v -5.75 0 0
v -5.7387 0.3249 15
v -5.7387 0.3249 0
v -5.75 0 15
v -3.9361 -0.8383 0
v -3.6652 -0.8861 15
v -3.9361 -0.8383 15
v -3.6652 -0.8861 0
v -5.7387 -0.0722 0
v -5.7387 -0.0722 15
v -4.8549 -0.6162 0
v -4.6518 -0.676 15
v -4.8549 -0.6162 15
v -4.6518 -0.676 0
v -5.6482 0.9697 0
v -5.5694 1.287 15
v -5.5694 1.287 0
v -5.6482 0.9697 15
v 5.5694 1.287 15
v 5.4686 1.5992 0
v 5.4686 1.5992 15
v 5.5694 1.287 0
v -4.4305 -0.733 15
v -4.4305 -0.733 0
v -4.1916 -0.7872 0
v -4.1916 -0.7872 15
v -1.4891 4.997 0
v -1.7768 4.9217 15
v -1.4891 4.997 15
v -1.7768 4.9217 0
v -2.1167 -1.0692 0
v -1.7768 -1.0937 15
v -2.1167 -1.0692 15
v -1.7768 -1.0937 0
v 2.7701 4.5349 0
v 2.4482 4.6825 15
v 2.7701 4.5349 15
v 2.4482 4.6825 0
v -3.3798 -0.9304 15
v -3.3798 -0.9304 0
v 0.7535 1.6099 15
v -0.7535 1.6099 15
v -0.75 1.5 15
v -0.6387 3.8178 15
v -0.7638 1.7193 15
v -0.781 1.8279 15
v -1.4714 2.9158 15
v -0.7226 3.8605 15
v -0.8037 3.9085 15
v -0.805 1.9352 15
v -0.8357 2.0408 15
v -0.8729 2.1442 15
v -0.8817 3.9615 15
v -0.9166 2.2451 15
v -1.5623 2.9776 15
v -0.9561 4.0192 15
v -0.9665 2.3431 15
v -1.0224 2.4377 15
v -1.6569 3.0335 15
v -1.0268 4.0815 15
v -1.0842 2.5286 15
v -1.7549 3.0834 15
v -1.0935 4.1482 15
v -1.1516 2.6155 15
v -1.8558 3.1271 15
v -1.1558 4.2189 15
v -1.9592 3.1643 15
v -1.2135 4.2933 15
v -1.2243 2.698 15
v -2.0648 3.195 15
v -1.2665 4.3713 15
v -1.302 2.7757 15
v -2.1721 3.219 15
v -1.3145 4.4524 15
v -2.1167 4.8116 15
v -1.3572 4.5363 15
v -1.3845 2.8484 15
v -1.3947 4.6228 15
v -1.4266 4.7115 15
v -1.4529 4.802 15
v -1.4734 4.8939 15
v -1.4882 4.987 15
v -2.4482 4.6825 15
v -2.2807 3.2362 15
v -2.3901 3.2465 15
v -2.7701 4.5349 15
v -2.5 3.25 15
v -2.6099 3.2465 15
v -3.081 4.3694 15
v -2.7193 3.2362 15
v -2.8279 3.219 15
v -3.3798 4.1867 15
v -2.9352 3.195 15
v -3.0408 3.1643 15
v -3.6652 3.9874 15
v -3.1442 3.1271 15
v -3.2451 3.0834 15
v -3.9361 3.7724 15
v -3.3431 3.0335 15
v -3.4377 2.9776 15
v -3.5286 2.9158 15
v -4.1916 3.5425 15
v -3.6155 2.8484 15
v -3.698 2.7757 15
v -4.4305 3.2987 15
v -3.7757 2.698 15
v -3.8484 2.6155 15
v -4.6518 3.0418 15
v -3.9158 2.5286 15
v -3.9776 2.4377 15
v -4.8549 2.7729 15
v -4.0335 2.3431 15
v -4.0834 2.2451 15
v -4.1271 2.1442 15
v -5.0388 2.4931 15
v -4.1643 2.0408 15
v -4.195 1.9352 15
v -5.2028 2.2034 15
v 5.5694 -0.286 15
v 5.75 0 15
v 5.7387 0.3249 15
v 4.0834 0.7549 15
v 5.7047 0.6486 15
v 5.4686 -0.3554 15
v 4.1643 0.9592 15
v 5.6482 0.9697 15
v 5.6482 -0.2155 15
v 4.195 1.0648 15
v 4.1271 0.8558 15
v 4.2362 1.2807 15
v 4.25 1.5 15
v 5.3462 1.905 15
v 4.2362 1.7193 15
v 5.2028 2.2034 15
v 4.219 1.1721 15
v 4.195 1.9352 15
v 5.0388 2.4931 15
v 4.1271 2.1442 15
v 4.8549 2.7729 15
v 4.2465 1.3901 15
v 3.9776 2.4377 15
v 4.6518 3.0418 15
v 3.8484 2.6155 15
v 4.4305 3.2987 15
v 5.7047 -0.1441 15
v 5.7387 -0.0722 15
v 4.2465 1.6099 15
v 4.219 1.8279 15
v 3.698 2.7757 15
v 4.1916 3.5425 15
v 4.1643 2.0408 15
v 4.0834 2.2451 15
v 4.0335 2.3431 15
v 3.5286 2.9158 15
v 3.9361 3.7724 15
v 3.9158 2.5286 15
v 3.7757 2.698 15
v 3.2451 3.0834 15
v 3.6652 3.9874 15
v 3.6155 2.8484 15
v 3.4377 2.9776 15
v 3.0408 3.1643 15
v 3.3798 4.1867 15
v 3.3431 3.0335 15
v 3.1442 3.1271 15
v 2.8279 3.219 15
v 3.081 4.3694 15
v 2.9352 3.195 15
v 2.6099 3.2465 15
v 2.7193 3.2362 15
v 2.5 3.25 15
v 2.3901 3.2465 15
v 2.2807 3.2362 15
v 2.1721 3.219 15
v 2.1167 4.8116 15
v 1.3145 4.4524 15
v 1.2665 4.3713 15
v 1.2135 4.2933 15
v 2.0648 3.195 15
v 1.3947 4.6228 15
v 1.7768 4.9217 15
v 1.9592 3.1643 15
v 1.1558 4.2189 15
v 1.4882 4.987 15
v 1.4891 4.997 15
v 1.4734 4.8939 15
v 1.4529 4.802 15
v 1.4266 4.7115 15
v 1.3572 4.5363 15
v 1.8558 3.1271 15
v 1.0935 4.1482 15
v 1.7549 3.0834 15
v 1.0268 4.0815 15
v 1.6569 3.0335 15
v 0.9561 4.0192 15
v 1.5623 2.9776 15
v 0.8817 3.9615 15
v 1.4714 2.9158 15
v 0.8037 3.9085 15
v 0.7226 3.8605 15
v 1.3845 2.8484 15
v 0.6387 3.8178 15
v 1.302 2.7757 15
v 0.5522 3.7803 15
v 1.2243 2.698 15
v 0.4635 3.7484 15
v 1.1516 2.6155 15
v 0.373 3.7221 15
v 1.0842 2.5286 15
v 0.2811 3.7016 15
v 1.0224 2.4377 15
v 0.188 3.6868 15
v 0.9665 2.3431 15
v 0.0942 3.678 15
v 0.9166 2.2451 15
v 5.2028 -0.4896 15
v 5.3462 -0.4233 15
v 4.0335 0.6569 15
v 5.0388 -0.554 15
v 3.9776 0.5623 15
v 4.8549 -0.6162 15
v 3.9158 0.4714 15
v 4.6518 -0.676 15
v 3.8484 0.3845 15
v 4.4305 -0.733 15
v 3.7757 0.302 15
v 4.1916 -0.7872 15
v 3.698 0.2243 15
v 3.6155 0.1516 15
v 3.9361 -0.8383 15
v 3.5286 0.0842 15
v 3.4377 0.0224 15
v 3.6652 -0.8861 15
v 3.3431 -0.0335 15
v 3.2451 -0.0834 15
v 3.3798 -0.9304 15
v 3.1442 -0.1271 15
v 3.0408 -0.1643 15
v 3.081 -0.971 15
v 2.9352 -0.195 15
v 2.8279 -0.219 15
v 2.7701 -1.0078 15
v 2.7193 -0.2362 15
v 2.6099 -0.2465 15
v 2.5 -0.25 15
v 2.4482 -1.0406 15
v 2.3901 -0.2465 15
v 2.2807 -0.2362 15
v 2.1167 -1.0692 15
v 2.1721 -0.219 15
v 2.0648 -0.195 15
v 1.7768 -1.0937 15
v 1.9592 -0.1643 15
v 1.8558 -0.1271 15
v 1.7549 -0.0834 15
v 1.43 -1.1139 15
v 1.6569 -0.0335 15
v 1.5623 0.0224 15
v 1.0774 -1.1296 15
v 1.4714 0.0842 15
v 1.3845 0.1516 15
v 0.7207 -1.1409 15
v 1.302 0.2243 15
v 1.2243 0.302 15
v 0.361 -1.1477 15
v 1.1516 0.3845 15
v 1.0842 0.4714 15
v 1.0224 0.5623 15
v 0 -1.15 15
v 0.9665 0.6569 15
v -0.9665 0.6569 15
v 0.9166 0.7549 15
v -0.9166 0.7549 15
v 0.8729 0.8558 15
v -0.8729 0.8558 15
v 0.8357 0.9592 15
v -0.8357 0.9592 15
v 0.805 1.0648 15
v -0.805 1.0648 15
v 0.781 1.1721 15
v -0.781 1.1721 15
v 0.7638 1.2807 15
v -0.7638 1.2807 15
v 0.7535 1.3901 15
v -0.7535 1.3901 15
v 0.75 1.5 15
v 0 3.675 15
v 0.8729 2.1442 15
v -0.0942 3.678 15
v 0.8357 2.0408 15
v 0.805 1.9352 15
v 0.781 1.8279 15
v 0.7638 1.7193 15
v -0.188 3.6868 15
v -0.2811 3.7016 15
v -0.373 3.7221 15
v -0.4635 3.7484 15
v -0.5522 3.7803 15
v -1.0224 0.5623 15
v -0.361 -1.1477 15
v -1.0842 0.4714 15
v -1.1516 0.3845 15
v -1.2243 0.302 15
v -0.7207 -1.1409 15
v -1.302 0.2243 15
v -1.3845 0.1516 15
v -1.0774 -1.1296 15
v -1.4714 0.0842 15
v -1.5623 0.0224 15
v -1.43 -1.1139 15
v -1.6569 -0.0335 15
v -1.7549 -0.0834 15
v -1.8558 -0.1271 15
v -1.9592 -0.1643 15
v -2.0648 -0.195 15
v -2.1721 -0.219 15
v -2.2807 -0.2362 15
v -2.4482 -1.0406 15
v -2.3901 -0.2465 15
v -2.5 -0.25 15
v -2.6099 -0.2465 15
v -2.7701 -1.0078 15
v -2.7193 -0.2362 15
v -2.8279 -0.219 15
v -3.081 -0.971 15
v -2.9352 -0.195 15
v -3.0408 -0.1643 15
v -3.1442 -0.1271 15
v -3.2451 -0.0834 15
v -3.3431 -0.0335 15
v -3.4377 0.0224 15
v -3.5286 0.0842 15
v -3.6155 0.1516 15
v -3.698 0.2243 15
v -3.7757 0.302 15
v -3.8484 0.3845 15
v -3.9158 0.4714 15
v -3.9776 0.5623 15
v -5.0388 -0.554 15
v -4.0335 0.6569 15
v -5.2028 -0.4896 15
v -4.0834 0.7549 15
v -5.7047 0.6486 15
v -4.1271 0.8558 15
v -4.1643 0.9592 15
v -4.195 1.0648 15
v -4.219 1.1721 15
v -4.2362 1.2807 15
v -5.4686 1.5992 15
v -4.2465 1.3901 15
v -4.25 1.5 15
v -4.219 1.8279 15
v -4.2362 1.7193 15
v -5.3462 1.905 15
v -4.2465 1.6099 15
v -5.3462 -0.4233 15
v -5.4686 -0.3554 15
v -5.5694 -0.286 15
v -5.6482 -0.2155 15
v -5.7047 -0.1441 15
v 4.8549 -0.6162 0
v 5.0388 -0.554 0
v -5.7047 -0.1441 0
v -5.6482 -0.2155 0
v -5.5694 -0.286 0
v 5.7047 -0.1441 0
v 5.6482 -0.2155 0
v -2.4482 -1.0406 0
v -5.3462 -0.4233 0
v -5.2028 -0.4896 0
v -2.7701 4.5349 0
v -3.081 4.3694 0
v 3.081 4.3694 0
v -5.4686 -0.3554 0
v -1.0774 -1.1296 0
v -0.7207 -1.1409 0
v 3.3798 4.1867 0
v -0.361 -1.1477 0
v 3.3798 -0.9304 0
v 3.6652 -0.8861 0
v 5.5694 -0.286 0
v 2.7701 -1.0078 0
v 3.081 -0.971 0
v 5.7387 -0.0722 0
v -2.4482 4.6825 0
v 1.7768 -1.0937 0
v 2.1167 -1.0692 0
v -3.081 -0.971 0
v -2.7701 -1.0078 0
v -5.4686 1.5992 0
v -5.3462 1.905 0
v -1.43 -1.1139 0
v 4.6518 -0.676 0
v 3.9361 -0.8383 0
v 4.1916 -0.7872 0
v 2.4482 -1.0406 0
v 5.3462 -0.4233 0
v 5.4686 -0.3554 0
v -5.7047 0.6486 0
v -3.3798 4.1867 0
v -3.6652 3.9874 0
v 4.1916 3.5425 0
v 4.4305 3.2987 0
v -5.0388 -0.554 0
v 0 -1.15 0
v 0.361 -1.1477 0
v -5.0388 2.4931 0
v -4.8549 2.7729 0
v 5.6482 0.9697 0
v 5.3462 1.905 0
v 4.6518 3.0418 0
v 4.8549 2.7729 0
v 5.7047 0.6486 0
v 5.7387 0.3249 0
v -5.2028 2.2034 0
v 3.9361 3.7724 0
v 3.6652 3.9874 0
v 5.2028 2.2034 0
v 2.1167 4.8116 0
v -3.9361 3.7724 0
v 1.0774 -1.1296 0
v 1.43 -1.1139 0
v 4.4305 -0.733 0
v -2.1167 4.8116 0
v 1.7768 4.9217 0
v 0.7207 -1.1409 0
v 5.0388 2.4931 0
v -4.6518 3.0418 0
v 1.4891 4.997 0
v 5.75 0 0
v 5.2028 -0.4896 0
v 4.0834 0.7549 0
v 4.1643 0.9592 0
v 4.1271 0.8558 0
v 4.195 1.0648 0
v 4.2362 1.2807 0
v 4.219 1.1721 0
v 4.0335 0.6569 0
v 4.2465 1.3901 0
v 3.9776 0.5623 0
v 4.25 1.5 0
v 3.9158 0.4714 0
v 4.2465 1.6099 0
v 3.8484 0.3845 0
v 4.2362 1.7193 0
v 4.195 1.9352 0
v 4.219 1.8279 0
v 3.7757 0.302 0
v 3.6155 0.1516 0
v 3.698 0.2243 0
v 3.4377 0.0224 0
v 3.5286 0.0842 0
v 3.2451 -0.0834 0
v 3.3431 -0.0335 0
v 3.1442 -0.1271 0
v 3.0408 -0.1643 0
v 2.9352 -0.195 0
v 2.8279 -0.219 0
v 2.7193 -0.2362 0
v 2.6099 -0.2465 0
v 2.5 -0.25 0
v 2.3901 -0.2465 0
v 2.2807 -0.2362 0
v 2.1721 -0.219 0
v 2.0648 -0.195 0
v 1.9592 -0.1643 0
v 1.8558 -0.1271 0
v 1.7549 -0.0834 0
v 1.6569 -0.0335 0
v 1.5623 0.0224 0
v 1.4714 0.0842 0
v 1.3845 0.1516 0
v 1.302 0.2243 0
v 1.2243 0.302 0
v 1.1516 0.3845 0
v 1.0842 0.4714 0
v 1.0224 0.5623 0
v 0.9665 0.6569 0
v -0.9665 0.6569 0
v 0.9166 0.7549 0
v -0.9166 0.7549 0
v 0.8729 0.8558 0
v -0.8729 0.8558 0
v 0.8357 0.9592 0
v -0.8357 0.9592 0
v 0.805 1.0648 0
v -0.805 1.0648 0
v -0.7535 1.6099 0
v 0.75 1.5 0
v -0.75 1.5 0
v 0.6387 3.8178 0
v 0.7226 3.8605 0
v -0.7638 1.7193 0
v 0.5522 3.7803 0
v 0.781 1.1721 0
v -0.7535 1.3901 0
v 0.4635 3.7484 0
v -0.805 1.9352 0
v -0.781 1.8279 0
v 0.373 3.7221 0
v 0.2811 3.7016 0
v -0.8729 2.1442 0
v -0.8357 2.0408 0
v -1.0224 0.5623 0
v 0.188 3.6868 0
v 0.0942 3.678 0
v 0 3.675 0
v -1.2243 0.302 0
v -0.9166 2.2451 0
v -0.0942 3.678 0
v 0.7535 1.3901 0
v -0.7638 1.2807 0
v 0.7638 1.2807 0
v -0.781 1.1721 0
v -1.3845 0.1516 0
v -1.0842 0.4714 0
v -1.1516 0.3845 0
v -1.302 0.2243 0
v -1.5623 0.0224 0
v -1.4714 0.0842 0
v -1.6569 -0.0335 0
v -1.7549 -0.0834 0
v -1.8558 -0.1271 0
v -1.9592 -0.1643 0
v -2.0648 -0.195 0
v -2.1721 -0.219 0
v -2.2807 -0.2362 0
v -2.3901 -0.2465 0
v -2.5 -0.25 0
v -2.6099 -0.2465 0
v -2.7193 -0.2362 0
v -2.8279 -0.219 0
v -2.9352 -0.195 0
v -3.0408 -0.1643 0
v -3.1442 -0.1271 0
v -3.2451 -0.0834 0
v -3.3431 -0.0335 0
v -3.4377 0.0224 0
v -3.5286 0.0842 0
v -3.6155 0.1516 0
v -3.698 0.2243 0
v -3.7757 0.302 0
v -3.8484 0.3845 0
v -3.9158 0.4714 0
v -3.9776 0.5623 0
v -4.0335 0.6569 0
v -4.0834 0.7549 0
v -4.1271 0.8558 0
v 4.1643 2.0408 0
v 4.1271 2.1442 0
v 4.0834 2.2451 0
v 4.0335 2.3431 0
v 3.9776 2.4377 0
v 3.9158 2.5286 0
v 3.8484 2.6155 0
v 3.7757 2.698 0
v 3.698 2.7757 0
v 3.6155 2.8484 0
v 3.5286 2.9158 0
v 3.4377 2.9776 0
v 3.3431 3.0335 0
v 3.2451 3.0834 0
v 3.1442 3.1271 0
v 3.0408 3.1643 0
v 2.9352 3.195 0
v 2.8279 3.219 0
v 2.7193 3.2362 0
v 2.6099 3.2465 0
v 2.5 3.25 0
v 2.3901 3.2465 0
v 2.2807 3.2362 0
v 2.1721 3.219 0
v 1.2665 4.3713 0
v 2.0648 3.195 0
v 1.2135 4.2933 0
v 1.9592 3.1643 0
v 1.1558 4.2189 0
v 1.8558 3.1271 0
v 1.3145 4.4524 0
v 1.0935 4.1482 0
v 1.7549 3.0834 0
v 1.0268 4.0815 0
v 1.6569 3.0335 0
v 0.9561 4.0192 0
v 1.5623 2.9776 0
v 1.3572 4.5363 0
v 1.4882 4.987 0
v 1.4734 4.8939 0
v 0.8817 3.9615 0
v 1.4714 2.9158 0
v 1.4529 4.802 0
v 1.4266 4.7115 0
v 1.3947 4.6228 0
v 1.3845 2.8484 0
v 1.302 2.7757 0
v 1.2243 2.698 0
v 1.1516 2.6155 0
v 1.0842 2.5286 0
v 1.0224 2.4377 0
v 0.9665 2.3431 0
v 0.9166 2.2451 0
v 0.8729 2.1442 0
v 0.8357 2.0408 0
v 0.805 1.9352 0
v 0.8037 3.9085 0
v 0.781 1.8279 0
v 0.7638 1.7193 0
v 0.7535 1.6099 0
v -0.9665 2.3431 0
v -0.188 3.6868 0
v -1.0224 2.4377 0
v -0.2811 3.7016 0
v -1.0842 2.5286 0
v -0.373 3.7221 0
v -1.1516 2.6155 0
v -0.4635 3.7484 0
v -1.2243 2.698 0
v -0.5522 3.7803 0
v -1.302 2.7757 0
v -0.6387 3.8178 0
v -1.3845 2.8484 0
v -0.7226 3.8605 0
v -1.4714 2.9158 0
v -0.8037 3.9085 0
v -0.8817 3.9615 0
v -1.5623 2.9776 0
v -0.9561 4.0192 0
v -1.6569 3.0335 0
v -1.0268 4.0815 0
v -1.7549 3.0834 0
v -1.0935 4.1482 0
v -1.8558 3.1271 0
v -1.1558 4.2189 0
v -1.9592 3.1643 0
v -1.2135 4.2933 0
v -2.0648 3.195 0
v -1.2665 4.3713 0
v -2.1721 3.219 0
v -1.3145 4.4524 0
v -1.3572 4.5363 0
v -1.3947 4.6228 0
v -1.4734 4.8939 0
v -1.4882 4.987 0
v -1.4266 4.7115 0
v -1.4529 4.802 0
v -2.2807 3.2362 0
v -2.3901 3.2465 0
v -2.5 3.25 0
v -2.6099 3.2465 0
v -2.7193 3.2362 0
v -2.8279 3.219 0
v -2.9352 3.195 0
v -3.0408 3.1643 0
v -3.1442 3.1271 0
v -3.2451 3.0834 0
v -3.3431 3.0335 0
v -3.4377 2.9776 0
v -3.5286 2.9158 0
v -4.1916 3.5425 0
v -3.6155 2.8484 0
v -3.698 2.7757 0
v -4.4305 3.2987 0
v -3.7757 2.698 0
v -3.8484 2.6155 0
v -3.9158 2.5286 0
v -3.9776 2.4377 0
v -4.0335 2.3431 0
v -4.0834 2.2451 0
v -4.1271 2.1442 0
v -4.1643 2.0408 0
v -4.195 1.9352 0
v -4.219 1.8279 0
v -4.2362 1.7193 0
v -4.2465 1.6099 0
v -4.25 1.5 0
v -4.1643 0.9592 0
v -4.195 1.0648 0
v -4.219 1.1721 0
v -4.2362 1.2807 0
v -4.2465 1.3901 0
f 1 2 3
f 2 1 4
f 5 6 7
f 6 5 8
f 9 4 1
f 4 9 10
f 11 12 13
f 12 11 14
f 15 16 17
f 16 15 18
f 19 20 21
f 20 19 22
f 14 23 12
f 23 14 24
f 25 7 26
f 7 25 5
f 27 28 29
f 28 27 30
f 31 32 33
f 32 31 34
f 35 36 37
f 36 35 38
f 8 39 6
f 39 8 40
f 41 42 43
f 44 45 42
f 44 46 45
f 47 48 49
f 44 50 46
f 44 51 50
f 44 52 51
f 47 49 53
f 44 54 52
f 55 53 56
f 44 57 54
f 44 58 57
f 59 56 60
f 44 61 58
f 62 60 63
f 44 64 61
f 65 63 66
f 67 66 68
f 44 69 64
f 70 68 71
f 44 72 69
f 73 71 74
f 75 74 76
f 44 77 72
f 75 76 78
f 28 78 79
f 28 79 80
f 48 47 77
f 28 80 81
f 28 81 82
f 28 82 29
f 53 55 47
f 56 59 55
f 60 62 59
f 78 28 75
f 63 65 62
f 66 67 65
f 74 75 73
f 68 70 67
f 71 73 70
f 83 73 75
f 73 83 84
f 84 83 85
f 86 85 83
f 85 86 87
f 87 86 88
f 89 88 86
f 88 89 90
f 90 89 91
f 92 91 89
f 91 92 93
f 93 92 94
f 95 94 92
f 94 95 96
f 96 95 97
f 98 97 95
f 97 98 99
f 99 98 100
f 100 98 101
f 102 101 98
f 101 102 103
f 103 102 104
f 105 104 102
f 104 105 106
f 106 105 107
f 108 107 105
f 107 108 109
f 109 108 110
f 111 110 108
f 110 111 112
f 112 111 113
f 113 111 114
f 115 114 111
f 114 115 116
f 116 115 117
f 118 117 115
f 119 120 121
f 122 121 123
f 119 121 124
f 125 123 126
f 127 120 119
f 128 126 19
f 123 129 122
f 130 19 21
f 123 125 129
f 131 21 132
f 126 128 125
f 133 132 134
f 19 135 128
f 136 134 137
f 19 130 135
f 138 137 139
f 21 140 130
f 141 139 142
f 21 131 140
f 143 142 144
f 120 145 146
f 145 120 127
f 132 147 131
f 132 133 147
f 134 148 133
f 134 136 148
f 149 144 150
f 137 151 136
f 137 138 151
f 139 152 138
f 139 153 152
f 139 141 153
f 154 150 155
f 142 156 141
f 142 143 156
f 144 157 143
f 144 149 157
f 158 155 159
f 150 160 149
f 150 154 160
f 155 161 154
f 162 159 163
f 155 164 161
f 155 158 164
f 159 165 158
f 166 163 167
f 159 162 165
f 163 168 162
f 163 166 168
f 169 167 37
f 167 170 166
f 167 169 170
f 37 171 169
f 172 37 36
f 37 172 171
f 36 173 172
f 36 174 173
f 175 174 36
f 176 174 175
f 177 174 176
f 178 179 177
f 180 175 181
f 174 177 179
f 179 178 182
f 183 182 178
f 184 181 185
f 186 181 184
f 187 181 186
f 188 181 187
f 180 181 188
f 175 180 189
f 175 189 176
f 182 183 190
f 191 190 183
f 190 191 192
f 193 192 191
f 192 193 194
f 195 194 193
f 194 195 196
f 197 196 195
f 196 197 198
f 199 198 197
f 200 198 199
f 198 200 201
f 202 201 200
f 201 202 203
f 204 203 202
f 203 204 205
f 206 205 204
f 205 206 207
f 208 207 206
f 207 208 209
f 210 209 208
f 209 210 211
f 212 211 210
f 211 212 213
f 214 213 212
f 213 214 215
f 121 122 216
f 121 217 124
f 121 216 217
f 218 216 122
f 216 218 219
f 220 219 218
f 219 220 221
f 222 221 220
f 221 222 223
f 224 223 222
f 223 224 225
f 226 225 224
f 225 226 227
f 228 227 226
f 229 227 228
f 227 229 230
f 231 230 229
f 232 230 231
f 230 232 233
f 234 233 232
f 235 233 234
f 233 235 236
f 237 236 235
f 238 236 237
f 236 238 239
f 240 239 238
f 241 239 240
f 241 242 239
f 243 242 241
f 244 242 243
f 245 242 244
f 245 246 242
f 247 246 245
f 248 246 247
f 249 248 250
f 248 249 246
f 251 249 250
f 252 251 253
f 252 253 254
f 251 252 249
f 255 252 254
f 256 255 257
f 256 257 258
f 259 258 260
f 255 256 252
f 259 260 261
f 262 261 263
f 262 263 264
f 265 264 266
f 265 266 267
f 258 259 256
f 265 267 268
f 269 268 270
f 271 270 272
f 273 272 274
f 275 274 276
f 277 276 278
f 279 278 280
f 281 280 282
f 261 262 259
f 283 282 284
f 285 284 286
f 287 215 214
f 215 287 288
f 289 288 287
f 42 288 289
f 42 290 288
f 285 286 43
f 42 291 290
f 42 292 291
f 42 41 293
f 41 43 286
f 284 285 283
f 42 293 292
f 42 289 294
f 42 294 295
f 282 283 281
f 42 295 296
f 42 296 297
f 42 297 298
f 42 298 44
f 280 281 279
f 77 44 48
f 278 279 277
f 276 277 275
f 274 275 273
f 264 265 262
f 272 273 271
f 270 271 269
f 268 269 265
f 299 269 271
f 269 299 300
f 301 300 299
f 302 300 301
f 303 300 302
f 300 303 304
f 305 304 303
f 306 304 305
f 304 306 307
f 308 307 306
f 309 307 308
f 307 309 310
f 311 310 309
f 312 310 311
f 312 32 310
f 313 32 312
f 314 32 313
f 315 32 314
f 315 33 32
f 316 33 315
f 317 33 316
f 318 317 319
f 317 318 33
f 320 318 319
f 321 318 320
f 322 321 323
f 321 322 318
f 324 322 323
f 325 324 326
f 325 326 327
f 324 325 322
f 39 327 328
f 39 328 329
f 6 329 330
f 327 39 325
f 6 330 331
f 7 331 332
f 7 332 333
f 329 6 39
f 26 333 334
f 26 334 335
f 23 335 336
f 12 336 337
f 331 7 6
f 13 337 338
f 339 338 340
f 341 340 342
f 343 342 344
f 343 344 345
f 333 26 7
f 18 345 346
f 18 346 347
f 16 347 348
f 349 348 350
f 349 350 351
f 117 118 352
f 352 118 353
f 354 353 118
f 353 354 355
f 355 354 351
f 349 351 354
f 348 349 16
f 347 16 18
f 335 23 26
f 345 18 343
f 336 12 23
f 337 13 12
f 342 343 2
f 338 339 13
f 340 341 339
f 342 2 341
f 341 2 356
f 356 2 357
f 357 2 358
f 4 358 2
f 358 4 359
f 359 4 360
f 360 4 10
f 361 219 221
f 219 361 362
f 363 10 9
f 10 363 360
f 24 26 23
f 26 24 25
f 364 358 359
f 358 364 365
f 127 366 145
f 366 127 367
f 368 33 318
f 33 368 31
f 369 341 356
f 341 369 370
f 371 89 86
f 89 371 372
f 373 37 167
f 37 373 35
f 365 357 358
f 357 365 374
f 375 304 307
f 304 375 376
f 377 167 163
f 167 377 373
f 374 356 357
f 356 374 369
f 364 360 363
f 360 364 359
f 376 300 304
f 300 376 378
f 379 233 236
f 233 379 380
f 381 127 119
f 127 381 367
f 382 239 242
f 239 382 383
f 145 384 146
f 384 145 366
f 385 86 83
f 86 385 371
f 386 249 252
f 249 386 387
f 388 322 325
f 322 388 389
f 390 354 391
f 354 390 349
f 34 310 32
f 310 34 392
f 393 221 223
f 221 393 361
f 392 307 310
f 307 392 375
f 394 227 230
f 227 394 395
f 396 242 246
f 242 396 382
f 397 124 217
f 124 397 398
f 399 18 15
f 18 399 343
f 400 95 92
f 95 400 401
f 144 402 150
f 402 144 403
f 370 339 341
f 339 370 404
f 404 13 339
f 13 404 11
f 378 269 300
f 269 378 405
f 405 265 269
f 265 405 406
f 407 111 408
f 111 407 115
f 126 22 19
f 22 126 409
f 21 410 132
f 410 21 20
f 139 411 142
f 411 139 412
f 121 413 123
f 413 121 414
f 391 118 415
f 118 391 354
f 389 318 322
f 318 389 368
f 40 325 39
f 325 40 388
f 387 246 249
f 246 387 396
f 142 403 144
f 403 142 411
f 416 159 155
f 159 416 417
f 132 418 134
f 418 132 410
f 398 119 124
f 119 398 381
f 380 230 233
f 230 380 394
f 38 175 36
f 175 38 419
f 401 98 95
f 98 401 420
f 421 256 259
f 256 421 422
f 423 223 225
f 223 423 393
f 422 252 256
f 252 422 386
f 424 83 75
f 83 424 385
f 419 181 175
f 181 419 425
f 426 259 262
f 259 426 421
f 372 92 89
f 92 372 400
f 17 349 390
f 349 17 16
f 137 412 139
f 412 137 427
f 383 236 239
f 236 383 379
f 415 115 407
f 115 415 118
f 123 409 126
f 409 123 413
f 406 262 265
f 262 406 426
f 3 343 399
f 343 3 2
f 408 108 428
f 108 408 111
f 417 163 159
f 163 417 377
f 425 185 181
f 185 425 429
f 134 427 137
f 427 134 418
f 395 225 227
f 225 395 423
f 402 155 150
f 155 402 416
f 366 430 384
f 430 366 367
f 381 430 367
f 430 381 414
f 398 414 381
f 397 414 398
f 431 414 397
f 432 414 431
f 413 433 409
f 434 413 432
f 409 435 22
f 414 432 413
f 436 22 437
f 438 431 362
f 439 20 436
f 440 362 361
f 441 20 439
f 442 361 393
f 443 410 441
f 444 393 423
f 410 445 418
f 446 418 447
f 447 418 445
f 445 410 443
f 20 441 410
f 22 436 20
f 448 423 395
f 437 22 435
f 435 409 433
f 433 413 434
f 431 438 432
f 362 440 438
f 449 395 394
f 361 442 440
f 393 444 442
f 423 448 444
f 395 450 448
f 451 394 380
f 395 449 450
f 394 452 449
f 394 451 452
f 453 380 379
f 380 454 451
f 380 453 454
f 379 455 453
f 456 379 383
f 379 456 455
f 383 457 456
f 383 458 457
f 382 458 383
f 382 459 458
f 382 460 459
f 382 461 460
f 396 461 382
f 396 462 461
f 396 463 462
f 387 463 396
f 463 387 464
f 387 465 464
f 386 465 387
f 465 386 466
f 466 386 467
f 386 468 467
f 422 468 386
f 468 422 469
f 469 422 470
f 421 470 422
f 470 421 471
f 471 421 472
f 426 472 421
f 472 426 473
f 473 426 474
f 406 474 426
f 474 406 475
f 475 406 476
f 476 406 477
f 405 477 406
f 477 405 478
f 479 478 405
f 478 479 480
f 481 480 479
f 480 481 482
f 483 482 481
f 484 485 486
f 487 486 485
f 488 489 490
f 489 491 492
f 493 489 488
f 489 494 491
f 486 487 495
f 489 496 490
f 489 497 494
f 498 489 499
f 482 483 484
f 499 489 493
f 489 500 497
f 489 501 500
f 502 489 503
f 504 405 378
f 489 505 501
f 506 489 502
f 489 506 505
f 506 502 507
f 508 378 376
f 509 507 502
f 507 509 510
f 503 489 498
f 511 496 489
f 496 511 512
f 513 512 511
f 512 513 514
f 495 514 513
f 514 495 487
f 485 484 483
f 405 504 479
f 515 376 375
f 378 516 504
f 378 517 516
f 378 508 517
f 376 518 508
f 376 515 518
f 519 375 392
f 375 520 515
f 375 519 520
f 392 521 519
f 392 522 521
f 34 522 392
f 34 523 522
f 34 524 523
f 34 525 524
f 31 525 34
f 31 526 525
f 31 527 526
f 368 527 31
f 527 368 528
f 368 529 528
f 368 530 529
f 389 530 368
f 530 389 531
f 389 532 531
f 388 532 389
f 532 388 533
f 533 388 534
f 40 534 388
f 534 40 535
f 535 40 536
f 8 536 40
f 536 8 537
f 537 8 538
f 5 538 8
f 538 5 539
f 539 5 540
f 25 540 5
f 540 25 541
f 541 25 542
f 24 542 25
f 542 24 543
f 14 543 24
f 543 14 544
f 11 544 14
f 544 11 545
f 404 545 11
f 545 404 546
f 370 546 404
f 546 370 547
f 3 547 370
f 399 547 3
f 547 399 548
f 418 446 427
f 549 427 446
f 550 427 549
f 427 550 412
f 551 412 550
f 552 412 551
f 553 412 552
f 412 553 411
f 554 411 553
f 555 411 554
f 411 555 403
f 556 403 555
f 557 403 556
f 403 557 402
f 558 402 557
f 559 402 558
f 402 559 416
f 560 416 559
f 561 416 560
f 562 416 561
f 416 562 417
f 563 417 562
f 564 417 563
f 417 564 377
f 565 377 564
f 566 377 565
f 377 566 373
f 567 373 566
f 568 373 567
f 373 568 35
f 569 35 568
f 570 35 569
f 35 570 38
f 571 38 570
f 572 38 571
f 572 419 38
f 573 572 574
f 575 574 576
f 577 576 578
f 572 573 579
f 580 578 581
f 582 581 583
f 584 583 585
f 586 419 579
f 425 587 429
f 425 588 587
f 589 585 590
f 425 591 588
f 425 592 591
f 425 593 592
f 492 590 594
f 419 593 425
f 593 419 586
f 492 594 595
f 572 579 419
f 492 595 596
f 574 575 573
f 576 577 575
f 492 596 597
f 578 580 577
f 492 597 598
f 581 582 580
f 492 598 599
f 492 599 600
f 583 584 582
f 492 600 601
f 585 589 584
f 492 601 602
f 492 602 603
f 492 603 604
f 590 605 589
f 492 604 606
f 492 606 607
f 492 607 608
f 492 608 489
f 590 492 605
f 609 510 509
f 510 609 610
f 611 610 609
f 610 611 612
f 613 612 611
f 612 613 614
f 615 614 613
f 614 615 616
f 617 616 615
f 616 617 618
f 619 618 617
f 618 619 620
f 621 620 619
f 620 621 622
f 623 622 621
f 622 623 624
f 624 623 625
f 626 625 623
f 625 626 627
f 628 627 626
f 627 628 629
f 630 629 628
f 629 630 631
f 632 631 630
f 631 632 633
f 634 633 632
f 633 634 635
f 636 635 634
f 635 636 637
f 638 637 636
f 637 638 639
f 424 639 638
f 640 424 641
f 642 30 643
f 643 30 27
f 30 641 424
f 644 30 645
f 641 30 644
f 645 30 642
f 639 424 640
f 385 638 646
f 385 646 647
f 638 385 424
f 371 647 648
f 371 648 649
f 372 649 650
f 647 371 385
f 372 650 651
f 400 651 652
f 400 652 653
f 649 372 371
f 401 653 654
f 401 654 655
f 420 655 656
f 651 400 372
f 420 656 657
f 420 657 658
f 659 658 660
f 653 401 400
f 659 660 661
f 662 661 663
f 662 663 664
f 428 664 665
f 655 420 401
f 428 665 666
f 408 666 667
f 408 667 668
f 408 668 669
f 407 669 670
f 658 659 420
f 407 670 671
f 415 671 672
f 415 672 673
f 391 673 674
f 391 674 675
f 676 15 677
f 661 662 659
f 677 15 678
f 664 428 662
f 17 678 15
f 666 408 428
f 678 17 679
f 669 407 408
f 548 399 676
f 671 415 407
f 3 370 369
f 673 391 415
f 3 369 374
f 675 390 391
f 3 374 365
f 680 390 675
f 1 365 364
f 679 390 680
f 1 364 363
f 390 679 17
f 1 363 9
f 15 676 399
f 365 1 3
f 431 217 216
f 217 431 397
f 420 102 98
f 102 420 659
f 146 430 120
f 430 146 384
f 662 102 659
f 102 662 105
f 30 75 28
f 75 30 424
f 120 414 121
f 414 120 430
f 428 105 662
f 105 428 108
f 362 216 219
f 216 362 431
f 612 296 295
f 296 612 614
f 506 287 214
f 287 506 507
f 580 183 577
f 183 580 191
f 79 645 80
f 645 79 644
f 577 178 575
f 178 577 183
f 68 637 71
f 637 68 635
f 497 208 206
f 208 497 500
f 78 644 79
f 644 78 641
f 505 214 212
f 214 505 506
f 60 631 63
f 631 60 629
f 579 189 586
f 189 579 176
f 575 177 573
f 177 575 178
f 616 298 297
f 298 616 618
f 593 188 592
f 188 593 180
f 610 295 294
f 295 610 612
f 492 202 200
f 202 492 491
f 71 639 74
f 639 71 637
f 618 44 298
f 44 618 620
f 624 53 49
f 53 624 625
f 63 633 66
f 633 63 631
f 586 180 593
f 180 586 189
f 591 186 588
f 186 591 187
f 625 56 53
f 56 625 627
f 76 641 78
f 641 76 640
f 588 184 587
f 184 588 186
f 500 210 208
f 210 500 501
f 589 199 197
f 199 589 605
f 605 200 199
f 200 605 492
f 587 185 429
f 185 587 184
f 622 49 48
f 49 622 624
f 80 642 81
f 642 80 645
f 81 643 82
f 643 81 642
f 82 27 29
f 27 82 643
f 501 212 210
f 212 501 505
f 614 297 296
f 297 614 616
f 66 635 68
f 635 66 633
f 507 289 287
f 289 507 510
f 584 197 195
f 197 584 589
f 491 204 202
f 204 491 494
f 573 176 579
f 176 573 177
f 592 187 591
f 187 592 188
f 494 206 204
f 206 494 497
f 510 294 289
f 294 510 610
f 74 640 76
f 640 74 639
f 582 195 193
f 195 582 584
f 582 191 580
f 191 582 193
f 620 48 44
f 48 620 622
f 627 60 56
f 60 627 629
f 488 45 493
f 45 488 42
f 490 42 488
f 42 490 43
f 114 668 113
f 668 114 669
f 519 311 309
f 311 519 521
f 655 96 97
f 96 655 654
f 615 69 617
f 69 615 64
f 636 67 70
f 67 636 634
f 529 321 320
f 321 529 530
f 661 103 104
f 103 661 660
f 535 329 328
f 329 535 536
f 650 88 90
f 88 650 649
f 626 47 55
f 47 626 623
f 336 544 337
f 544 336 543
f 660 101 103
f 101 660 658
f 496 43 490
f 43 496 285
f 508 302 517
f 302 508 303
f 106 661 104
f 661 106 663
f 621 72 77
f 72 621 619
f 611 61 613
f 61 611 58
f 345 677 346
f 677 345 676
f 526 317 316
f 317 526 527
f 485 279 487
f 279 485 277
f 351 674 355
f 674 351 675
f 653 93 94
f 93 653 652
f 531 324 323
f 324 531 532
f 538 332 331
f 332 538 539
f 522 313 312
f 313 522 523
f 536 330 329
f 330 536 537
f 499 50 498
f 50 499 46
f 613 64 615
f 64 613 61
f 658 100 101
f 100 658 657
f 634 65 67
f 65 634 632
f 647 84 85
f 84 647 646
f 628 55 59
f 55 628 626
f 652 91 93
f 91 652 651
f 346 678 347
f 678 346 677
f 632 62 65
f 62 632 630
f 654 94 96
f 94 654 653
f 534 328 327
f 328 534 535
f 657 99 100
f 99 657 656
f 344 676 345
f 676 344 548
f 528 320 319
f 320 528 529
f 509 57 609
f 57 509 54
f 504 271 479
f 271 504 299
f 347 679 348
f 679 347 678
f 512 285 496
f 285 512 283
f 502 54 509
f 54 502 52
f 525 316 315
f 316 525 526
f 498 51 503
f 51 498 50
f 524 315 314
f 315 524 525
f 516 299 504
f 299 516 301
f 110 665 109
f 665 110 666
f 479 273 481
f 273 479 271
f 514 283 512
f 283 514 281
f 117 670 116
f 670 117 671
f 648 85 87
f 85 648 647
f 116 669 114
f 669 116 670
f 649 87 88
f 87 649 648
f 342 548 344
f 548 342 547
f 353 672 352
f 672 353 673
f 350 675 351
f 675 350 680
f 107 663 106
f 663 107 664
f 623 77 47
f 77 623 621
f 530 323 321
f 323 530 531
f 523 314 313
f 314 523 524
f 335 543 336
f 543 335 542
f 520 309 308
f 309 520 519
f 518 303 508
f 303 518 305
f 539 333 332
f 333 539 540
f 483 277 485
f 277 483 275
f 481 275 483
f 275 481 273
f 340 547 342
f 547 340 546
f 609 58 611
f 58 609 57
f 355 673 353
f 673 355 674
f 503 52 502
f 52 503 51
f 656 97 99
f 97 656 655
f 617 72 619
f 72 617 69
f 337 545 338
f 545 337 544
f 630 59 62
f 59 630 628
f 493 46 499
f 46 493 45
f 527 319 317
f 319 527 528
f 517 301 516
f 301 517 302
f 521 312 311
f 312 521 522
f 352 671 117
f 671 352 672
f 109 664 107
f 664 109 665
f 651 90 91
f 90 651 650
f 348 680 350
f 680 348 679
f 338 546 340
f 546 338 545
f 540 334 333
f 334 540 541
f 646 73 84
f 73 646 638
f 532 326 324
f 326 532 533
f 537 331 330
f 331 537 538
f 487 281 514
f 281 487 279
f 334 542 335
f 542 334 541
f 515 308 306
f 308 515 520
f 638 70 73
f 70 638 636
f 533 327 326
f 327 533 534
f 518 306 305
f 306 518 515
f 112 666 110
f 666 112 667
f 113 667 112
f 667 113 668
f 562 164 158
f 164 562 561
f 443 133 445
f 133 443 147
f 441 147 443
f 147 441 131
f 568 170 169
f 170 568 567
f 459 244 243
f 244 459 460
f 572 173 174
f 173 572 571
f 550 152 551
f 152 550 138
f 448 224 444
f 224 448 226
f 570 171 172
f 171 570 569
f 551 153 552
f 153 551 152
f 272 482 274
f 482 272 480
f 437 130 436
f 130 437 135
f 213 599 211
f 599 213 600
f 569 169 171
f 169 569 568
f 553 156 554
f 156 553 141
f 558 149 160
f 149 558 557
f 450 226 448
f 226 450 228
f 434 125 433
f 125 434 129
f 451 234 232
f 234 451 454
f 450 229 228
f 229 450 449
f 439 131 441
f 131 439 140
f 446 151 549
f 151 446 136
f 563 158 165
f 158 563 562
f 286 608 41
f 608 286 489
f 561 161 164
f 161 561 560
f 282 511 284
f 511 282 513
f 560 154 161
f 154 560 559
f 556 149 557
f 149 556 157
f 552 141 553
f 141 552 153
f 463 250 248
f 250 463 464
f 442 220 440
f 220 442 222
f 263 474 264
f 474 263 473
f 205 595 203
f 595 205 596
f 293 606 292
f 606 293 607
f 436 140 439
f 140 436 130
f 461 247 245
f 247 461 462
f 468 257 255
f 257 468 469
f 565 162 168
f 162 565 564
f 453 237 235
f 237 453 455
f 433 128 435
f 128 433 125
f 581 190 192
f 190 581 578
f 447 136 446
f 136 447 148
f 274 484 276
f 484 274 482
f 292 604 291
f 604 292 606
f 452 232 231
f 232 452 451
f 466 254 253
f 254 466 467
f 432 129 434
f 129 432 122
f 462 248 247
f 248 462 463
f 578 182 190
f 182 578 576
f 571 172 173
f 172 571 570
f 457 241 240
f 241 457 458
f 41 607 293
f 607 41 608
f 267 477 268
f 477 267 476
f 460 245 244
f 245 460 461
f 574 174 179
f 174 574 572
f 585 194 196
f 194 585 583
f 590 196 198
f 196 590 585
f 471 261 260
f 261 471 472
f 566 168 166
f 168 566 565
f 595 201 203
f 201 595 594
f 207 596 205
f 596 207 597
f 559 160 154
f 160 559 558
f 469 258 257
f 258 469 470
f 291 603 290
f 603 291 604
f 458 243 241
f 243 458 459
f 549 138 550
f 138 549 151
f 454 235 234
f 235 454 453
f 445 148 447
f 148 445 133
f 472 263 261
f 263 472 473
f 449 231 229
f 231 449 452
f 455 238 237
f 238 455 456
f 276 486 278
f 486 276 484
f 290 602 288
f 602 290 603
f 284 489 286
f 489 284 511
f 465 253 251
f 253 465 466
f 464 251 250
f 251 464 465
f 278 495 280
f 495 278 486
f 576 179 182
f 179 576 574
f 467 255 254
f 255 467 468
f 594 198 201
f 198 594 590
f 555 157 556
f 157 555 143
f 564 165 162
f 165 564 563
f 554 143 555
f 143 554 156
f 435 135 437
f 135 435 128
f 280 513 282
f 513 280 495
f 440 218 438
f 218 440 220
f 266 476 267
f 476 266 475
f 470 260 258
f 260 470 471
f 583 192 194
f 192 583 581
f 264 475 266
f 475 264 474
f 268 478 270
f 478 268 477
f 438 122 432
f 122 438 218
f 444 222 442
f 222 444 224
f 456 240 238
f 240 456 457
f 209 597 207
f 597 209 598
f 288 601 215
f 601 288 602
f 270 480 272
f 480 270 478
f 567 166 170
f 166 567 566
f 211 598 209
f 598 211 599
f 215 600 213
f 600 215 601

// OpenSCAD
HOLE_DIA = 3.5;
HOLE_SPACING = 5;
HOLE_OFFSET = 1.5;

CHANNEL_DIA = 3;

WIDTH = 11.5;
HEIGHT = 15;

TOP_SCALE = 0.9;
BOT_SCALE = 0.2;

$fn = 100;

difference() {
  hull() {
    intersection() {
      scale([1.0, TOP_SCALE, 1.0])
      cylinder(d = WIDTH, h = HEIGHT);
      translate([-WIDTH/2, 0, 0])
      cube(size = [WIDTH, WIDTH, HEIGHT]);
    }

      intersection() {
      scale([1.0, BOT_SCALE, 1.0])
      cylinder(d = WIDTH, h = HEIGHT);
      translate([-WIDTH/2, -WIDTH, 0])
      cube(size = [WIDTH, WIDTH, HEIGHT]);
    }
  }

  #translate([0, WIDTH/2 * TOP_SCALE, 0])
  cylinder(d = CHANNEL_DIA, h = HEIGHT);

  #translate([-HOLE_SPACING/2, HOLE_OFFSET, 0])
  cylinder(d = HOLE_DIA, h = HEIGHT);

  #translate([HOLE_SPACING/2, HOLE_OFFSET, 0])
  cylinder(d = HOLE_DIA, h = HEIGHT);
}
